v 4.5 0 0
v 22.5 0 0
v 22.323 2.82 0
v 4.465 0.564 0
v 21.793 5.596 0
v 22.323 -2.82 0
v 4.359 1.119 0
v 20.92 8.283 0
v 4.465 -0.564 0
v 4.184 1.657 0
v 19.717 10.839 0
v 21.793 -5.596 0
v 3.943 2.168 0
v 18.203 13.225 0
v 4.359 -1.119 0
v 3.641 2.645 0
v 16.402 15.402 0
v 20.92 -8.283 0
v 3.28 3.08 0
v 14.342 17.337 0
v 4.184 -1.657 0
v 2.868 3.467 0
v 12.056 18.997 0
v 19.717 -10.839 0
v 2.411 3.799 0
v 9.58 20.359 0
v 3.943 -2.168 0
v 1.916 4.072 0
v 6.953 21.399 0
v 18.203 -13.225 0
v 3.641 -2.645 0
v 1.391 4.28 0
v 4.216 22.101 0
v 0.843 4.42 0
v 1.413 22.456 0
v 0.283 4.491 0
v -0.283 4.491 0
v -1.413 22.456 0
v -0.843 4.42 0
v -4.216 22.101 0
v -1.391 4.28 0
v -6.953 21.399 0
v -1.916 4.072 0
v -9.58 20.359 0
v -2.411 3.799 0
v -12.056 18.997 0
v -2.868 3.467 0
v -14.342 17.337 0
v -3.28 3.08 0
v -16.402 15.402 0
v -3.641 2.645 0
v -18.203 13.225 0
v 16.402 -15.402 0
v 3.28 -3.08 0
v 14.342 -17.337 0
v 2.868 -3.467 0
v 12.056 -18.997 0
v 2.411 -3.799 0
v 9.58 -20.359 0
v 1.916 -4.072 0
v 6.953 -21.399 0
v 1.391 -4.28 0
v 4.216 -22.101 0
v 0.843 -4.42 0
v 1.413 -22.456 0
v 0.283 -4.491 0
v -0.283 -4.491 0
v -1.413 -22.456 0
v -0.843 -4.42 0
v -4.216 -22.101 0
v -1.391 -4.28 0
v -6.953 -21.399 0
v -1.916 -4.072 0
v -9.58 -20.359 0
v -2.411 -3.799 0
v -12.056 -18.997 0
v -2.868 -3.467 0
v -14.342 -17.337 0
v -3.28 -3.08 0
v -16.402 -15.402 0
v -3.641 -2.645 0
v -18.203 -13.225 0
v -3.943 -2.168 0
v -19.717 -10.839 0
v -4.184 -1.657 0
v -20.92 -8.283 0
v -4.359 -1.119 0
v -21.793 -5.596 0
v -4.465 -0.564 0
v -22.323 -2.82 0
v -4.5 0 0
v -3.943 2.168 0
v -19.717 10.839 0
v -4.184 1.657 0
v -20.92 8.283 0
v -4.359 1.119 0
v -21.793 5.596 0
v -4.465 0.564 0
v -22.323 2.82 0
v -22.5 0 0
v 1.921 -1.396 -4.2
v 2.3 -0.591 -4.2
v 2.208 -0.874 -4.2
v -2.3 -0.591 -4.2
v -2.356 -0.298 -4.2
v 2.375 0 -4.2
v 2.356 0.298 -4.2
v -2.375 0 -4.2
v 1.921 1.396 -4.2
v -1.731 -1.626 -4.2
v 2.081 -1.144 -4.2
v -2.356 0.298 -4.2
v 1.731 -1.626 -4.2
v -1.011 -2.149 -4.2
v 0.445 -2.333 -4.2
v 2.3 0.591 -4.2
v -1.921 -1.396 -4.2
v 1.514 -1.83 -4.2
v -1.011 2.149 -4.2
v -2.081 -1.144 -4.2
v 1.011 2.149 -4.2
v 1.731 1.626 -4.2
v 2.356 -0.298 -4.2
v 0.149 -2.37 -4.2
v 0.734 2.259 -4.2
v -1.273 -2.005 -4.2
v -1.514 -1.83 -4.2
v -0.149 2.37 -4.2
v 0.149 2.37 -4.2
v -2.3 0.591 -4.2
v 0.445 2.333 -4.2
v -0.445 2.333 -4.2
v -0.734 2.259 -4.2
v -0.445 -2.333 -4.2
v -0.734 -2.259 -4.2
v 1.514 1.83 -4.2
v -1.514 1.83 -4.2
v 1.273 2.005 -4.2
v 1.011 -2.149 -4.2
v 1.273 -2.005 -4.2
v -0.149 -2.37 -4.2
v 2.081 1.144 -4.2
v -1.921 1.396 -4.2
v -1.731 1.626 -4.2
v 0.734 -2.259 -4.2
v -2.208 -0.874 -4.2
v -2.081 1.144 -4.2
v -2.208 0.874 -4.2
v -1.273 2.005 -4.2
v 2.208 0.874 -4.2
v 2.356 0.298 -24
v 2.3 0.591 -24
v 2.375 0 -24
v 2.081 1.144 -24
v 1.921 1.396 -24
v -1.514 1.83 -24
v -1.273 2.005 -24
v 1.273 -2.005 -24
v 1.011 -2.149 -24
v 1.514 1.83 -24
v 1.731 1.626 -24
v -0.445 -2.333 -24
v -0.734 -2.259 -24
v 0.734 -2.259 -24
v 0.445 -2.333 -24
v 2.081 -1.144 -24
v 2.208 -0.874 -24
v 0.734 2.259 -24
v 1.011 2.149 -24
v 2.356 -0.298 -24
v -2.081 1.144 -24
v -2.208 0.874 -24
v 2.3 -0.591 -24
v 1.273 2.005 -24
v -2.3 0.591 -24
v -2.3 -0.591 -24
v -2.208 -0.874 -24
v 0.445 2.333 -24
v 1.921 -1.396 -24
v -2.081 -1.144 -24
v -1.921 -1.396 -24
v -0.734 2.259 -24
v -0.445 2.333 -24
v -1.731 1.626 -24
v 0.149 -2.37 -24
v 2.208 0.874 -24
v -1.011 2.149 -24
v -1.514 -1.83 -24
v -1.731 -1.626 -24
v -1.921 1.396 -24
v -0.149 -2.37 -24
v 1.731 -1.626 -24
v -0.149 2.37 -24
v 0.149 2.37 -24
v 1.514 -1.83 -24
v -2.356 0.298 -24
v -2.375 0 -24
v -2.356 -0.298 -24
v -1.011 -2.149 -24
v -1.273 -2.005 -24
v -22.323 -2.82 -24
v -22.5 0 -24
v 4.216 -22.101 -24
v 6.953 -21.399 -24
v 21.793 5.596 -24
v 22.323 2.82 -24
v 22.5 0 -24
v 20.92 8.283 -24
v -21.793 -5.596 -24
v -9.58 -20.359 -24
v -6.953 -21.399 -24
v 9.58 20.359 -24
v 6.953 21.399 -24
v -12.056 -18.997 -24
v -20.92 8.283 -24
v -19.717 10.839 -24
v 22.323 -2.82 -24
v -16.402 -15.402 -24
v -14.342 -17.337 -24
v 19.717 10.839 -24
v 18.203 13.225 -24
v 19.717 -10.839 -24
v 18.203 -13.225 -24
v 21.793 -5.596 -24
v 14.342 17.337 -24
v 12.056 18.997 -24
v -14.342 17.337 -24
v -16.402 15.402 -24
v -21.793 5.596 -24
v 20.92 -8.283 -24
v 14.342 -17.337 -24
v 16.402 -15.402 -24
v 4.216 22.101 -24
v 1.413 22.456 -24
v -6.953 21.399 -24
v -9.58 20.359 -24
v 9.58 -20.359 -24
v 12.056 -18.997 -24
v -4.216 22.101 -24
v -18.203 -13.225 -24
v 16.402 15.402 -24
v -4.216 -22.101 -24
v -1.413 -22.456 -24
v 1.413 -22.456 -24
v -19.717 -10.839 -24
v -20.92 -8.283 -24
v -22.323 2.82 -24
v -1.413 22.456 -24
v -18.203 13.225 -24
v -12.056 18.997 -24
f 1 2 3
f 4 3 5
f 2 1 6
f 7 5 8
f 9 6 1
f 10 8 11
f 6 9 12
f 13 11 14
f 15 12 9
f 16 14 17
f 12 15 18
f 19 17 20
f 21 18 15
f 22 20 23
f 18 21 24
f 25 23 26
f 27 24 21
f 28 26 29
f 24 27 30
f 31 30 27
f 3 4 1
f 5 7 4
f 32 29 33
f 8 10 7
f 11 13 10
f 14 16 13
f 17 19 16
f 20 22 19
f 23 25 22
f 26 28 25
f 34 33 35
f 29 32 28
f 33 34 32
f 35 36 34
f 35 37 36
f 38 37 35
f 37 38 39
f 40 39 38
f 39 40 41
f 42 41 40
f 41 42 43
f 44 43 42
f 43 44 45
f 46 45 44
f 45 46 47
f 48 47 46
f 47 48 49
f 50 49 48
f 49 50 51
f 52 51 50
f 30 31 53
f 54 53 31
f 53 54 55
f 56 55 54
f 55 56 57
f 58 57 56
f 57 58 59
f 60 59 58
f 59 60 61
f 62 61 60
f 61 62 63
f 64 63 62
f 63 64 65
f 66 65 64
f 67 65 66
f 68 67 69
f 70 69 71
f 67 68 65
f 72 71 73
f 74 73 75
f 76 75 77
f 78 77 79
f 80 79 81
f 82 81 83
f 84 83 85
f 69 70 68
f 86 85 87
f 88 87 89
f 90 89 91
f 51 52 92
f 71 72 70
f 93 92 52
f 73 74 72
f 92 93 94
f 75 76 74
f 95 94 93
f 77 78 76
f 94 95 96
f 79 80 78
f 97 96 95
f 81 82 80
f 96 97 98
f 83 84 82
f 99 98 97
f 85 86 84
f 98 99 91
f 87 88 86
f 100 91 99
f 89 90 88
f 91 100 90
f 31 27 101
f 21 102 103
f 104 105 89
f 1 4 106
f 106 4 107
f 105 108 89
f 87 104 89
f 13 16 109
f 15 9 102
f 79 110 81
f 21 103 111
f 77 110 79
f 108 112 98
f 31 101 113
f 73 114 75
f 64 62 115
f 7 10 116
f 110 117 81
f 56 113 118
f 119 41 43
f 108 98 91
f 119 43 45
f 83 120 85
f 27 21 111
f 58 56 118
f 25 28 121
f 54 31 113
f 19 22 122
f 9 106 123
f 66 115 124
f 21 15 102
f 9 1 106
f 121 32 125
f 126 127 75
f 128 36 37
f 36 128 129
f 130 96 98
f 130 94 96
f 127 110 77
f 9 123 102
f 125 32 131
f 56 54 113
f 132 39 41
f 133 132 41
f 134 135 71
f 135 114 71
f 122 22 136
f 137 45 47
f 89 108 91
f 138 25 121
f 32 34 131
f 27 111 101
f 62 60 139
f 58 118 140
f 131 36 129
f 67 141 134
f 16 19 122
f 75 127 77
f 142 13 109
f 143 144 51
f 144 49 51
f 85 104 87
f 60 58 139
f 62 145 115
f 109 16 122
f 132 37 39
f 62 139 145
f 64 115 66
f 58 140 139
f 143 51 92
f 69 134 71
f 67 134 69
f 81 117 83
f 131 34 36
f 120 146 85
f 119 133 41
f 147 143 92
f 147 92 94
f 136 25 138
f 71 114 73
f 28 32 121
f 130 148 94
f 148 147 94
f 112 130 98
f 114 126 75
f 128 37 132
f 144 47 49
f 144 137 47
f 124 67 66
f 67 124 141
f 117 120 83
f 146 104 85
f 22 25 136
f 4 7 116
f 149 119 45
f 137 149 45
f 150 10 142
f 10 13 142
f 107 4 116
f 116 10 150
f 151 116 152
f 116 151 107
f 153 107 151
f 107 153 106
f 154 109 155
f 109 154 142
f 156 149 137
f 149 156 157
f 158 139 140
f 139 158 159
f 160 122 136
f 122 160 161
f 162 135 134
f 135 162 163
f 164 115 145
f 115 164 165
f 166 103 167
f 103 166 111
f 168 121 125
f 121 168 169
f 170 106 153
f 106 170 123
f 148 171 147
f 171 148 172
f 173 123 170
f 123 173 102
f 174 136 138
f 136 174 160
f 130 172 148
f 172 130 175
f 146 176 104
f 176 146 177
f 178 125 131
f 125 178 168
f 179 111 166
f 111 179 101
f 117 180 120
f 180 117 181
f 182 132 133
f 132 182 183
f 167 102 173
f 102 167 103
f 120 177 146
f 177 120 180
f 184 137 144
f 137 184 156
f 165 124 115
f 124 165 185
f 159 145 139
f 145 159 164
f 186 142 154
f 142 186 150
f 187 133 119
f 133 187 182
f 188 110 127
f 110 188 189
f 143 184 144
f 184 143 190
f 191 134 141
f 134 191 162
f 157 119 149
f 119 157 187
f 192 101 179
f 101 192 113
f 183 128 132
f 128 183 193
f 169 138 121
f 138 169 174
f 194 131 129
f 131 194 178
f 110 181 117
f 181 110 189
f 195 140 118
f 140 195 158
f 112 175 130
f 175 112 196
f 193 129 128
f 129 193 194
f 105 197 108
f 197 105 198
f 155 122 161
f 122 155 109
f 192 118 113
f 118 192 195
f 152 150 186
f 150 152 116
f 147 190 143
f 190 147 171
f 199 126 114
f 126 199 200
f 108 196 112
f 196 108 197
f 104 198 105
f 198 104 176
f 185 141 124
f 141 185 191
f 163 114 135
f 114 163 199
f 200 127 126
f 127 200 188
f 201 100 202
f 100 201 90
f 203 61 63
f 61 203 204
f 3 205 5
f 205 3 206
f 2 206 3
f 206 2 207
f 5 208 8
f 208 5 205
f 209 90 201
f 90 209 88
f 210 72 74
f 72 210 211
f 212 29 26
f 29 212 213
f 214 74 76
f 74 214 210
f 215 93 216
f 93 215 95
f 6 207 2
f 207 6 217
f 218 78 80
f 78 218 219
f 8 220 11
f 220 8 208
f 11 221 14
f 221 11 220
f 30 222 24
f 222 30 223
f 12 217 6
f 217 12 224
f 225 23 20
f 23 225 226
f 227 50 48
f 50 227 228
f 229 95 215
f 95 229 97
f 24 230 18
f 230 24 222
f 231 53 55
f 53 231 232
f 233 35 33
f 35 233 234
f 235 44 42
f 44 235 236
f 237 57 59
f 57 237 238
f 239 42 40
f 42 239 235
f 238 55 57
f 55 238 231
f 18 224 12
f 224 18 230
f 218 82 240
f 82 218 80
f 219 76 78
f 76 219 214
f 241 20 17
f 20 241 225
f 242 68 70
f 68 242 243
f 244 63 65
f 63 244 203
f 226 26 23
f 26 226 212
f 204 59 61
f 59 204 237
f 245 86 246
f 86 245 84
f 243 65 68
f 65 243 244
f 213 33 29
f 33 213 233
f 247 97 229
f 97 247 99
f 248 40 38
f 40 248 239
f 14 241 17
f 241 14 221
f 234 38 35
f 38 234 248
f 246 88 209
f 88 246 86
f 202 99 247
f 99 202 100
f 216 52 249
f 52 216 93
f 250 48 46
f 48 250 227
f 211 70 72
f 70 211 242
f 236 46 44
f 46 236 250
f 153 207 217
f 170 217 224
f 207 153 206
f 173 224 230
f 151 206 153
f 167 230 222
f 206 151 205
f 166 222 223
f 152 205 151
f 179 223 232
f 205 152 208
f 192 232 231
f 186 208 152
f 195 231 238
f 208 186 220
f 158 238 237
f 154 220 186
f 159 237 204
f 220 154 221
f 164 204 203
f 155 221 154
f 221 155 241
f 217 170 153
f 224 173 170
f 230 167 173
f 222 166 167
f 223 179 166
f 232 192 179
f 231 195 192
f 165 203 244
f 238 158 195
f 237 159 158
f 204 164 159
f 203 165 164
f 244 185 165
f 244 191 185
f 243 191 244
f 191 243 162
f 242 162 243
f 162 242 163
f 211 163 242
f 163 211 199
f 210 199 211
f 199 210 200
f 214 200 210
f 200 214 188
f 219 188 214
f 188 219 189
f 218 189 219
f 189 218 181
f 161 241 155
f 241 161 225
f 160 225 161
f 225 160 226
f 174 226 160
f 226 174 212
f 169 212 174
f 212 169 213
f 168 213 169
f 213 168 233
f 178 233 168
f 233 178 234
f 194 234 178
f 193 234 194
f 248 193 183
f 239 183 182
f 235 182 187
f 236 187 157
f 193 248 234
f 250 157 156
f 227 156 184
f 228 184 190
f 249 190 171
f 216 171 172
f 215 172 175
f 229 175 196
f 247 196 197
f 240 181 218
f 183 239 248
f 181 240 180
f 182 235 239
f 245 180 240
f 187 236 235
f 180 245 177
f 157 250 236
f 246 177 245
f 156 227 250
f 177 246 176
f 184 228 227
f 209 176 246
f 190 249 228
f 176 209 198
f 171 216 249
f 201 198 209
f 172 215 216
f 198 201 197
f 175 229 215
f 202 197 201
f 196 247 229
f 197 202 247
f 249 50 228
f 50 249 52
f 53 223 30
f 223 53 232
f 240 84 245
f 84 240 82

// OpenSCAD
$fn = 50;

difference() {
	union() {
		translate(v = [0, 0, -24.0]) {
			cylinder(h = 24, r = 22.5);
		}
	}
	union() {
		translate(v = [0, 0, 0]) {
			rotate(a = [0, 0, 0]) {
				difference() {
					union() {
						translate(v = [0, 0, -27.0]) {
							cylinder(h = 27, r = 2.25);
						}
						translate(v = [0, 0, -4.2]) {
							cylinder(h = 4.2, r1 = 2.375, r2 = 4.5);
						}
						translate(v = [0, 0, -27.0]) {
							cylinder(h = 27, r = 2.375);
						}
						translate(v = [0, 0, -27.0]) {
							cylinder(h = 27, r = 2.25);
						}
					}
					union();
				}
			}
		}
	}
}
